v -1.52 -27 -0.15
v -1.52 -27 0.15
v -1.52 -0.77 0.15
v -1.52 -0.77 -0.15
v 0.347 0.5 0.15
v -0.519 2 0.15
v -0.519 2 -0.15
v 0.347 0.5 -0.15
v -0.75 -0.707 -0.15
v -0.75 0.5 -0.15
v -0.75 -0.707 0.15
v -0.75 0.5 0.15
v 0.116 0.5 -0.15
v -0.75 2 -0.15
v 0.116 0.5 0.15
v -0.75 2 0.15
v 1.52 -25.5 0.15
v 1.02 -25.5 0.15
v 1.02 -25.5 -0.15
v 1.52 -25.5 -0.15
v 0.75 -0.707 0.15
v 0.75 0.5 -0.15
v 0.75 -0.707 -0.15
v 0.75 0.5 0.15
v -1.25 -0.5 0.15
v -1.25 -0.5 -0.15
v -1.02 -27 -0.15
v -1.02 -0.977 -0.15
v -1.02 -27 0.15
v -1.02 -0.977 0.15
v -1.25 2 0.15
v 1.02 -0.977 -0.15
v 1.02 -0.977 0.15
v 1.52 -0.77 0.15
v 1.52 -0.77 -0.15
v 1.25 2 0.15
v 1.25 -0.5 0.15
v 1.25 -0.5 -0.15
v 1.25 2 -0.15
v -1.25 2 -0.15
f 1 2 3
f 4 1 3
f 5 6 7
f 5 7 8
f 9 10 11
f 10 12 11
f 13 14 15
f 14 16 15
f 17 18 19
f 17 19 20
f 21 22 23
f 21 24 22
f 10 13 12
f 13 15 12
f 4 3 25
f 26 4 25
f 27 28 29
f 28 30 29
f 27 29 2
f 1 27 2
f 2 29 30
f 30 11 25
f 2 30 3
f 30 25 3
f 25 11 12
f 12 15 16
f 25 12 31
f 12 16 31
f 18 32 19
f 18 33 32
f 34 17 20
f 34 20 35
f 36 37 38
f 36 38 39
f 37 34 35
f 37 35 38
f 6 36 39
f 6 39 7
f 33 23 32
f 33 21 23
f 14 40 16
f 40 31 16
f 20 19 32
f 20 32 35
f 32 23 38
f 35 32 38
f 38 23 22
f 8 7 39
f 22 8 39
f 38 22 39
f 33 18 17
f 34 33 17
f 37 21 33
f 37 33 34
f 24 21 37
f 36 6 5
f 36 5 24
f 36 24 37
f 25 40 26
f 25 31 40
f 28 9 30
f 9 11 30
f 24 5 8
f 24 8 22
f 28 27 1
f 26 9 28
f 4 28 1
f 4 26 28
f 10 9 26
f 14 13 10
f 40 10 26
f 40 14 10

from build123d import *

# Parameters (mm, degrees)
BOSS_EXTRUDE1_DEPTH   = 0.15
BOSS_EXTRUDE1_2_DEPTH = 0.15


with BuildPart() as part:
    # Sketch1 → Boss-Extrude1 (new, symmetric)
    with BuildSketch(Plane.XY):
        Polygon((1.02, -0.977106781), (1.02, -25.5), (1.52, -25.5), (1.52, -0.77), (1.25, -0.5), (1.25, 0.5), (1.25, 2), (-0.519059892, 2), (0.346965511, 0.5), (0.75, 0.5), (0.75, -0.707106781), align=None)
    extrude(amount=BOSS_EXTRUDE1_DEPTH, both=True)


with BuildPart() as body_2:
    # Sketch1 → Boss-Extrude1 2 (new, symmetric)
    with BuildSketch(Plane.XY):
        Polygon((-1.52, -0.77), (-1.25, -0.5), (-1.25, 0.5), (-1.25, 2), (-0.75, 2), (0.116025404, 0.5), (-0.75, 0.5), (-0.75, -0.707106781), (-1.02, -0.977106781), (-1.02, -27), (-1.52, -27), align=None)
    extrude(amount=BOSS_EXTRUDE1_2_DEPTH, both=True)


solid = Compound([part.part, body_2.part])
